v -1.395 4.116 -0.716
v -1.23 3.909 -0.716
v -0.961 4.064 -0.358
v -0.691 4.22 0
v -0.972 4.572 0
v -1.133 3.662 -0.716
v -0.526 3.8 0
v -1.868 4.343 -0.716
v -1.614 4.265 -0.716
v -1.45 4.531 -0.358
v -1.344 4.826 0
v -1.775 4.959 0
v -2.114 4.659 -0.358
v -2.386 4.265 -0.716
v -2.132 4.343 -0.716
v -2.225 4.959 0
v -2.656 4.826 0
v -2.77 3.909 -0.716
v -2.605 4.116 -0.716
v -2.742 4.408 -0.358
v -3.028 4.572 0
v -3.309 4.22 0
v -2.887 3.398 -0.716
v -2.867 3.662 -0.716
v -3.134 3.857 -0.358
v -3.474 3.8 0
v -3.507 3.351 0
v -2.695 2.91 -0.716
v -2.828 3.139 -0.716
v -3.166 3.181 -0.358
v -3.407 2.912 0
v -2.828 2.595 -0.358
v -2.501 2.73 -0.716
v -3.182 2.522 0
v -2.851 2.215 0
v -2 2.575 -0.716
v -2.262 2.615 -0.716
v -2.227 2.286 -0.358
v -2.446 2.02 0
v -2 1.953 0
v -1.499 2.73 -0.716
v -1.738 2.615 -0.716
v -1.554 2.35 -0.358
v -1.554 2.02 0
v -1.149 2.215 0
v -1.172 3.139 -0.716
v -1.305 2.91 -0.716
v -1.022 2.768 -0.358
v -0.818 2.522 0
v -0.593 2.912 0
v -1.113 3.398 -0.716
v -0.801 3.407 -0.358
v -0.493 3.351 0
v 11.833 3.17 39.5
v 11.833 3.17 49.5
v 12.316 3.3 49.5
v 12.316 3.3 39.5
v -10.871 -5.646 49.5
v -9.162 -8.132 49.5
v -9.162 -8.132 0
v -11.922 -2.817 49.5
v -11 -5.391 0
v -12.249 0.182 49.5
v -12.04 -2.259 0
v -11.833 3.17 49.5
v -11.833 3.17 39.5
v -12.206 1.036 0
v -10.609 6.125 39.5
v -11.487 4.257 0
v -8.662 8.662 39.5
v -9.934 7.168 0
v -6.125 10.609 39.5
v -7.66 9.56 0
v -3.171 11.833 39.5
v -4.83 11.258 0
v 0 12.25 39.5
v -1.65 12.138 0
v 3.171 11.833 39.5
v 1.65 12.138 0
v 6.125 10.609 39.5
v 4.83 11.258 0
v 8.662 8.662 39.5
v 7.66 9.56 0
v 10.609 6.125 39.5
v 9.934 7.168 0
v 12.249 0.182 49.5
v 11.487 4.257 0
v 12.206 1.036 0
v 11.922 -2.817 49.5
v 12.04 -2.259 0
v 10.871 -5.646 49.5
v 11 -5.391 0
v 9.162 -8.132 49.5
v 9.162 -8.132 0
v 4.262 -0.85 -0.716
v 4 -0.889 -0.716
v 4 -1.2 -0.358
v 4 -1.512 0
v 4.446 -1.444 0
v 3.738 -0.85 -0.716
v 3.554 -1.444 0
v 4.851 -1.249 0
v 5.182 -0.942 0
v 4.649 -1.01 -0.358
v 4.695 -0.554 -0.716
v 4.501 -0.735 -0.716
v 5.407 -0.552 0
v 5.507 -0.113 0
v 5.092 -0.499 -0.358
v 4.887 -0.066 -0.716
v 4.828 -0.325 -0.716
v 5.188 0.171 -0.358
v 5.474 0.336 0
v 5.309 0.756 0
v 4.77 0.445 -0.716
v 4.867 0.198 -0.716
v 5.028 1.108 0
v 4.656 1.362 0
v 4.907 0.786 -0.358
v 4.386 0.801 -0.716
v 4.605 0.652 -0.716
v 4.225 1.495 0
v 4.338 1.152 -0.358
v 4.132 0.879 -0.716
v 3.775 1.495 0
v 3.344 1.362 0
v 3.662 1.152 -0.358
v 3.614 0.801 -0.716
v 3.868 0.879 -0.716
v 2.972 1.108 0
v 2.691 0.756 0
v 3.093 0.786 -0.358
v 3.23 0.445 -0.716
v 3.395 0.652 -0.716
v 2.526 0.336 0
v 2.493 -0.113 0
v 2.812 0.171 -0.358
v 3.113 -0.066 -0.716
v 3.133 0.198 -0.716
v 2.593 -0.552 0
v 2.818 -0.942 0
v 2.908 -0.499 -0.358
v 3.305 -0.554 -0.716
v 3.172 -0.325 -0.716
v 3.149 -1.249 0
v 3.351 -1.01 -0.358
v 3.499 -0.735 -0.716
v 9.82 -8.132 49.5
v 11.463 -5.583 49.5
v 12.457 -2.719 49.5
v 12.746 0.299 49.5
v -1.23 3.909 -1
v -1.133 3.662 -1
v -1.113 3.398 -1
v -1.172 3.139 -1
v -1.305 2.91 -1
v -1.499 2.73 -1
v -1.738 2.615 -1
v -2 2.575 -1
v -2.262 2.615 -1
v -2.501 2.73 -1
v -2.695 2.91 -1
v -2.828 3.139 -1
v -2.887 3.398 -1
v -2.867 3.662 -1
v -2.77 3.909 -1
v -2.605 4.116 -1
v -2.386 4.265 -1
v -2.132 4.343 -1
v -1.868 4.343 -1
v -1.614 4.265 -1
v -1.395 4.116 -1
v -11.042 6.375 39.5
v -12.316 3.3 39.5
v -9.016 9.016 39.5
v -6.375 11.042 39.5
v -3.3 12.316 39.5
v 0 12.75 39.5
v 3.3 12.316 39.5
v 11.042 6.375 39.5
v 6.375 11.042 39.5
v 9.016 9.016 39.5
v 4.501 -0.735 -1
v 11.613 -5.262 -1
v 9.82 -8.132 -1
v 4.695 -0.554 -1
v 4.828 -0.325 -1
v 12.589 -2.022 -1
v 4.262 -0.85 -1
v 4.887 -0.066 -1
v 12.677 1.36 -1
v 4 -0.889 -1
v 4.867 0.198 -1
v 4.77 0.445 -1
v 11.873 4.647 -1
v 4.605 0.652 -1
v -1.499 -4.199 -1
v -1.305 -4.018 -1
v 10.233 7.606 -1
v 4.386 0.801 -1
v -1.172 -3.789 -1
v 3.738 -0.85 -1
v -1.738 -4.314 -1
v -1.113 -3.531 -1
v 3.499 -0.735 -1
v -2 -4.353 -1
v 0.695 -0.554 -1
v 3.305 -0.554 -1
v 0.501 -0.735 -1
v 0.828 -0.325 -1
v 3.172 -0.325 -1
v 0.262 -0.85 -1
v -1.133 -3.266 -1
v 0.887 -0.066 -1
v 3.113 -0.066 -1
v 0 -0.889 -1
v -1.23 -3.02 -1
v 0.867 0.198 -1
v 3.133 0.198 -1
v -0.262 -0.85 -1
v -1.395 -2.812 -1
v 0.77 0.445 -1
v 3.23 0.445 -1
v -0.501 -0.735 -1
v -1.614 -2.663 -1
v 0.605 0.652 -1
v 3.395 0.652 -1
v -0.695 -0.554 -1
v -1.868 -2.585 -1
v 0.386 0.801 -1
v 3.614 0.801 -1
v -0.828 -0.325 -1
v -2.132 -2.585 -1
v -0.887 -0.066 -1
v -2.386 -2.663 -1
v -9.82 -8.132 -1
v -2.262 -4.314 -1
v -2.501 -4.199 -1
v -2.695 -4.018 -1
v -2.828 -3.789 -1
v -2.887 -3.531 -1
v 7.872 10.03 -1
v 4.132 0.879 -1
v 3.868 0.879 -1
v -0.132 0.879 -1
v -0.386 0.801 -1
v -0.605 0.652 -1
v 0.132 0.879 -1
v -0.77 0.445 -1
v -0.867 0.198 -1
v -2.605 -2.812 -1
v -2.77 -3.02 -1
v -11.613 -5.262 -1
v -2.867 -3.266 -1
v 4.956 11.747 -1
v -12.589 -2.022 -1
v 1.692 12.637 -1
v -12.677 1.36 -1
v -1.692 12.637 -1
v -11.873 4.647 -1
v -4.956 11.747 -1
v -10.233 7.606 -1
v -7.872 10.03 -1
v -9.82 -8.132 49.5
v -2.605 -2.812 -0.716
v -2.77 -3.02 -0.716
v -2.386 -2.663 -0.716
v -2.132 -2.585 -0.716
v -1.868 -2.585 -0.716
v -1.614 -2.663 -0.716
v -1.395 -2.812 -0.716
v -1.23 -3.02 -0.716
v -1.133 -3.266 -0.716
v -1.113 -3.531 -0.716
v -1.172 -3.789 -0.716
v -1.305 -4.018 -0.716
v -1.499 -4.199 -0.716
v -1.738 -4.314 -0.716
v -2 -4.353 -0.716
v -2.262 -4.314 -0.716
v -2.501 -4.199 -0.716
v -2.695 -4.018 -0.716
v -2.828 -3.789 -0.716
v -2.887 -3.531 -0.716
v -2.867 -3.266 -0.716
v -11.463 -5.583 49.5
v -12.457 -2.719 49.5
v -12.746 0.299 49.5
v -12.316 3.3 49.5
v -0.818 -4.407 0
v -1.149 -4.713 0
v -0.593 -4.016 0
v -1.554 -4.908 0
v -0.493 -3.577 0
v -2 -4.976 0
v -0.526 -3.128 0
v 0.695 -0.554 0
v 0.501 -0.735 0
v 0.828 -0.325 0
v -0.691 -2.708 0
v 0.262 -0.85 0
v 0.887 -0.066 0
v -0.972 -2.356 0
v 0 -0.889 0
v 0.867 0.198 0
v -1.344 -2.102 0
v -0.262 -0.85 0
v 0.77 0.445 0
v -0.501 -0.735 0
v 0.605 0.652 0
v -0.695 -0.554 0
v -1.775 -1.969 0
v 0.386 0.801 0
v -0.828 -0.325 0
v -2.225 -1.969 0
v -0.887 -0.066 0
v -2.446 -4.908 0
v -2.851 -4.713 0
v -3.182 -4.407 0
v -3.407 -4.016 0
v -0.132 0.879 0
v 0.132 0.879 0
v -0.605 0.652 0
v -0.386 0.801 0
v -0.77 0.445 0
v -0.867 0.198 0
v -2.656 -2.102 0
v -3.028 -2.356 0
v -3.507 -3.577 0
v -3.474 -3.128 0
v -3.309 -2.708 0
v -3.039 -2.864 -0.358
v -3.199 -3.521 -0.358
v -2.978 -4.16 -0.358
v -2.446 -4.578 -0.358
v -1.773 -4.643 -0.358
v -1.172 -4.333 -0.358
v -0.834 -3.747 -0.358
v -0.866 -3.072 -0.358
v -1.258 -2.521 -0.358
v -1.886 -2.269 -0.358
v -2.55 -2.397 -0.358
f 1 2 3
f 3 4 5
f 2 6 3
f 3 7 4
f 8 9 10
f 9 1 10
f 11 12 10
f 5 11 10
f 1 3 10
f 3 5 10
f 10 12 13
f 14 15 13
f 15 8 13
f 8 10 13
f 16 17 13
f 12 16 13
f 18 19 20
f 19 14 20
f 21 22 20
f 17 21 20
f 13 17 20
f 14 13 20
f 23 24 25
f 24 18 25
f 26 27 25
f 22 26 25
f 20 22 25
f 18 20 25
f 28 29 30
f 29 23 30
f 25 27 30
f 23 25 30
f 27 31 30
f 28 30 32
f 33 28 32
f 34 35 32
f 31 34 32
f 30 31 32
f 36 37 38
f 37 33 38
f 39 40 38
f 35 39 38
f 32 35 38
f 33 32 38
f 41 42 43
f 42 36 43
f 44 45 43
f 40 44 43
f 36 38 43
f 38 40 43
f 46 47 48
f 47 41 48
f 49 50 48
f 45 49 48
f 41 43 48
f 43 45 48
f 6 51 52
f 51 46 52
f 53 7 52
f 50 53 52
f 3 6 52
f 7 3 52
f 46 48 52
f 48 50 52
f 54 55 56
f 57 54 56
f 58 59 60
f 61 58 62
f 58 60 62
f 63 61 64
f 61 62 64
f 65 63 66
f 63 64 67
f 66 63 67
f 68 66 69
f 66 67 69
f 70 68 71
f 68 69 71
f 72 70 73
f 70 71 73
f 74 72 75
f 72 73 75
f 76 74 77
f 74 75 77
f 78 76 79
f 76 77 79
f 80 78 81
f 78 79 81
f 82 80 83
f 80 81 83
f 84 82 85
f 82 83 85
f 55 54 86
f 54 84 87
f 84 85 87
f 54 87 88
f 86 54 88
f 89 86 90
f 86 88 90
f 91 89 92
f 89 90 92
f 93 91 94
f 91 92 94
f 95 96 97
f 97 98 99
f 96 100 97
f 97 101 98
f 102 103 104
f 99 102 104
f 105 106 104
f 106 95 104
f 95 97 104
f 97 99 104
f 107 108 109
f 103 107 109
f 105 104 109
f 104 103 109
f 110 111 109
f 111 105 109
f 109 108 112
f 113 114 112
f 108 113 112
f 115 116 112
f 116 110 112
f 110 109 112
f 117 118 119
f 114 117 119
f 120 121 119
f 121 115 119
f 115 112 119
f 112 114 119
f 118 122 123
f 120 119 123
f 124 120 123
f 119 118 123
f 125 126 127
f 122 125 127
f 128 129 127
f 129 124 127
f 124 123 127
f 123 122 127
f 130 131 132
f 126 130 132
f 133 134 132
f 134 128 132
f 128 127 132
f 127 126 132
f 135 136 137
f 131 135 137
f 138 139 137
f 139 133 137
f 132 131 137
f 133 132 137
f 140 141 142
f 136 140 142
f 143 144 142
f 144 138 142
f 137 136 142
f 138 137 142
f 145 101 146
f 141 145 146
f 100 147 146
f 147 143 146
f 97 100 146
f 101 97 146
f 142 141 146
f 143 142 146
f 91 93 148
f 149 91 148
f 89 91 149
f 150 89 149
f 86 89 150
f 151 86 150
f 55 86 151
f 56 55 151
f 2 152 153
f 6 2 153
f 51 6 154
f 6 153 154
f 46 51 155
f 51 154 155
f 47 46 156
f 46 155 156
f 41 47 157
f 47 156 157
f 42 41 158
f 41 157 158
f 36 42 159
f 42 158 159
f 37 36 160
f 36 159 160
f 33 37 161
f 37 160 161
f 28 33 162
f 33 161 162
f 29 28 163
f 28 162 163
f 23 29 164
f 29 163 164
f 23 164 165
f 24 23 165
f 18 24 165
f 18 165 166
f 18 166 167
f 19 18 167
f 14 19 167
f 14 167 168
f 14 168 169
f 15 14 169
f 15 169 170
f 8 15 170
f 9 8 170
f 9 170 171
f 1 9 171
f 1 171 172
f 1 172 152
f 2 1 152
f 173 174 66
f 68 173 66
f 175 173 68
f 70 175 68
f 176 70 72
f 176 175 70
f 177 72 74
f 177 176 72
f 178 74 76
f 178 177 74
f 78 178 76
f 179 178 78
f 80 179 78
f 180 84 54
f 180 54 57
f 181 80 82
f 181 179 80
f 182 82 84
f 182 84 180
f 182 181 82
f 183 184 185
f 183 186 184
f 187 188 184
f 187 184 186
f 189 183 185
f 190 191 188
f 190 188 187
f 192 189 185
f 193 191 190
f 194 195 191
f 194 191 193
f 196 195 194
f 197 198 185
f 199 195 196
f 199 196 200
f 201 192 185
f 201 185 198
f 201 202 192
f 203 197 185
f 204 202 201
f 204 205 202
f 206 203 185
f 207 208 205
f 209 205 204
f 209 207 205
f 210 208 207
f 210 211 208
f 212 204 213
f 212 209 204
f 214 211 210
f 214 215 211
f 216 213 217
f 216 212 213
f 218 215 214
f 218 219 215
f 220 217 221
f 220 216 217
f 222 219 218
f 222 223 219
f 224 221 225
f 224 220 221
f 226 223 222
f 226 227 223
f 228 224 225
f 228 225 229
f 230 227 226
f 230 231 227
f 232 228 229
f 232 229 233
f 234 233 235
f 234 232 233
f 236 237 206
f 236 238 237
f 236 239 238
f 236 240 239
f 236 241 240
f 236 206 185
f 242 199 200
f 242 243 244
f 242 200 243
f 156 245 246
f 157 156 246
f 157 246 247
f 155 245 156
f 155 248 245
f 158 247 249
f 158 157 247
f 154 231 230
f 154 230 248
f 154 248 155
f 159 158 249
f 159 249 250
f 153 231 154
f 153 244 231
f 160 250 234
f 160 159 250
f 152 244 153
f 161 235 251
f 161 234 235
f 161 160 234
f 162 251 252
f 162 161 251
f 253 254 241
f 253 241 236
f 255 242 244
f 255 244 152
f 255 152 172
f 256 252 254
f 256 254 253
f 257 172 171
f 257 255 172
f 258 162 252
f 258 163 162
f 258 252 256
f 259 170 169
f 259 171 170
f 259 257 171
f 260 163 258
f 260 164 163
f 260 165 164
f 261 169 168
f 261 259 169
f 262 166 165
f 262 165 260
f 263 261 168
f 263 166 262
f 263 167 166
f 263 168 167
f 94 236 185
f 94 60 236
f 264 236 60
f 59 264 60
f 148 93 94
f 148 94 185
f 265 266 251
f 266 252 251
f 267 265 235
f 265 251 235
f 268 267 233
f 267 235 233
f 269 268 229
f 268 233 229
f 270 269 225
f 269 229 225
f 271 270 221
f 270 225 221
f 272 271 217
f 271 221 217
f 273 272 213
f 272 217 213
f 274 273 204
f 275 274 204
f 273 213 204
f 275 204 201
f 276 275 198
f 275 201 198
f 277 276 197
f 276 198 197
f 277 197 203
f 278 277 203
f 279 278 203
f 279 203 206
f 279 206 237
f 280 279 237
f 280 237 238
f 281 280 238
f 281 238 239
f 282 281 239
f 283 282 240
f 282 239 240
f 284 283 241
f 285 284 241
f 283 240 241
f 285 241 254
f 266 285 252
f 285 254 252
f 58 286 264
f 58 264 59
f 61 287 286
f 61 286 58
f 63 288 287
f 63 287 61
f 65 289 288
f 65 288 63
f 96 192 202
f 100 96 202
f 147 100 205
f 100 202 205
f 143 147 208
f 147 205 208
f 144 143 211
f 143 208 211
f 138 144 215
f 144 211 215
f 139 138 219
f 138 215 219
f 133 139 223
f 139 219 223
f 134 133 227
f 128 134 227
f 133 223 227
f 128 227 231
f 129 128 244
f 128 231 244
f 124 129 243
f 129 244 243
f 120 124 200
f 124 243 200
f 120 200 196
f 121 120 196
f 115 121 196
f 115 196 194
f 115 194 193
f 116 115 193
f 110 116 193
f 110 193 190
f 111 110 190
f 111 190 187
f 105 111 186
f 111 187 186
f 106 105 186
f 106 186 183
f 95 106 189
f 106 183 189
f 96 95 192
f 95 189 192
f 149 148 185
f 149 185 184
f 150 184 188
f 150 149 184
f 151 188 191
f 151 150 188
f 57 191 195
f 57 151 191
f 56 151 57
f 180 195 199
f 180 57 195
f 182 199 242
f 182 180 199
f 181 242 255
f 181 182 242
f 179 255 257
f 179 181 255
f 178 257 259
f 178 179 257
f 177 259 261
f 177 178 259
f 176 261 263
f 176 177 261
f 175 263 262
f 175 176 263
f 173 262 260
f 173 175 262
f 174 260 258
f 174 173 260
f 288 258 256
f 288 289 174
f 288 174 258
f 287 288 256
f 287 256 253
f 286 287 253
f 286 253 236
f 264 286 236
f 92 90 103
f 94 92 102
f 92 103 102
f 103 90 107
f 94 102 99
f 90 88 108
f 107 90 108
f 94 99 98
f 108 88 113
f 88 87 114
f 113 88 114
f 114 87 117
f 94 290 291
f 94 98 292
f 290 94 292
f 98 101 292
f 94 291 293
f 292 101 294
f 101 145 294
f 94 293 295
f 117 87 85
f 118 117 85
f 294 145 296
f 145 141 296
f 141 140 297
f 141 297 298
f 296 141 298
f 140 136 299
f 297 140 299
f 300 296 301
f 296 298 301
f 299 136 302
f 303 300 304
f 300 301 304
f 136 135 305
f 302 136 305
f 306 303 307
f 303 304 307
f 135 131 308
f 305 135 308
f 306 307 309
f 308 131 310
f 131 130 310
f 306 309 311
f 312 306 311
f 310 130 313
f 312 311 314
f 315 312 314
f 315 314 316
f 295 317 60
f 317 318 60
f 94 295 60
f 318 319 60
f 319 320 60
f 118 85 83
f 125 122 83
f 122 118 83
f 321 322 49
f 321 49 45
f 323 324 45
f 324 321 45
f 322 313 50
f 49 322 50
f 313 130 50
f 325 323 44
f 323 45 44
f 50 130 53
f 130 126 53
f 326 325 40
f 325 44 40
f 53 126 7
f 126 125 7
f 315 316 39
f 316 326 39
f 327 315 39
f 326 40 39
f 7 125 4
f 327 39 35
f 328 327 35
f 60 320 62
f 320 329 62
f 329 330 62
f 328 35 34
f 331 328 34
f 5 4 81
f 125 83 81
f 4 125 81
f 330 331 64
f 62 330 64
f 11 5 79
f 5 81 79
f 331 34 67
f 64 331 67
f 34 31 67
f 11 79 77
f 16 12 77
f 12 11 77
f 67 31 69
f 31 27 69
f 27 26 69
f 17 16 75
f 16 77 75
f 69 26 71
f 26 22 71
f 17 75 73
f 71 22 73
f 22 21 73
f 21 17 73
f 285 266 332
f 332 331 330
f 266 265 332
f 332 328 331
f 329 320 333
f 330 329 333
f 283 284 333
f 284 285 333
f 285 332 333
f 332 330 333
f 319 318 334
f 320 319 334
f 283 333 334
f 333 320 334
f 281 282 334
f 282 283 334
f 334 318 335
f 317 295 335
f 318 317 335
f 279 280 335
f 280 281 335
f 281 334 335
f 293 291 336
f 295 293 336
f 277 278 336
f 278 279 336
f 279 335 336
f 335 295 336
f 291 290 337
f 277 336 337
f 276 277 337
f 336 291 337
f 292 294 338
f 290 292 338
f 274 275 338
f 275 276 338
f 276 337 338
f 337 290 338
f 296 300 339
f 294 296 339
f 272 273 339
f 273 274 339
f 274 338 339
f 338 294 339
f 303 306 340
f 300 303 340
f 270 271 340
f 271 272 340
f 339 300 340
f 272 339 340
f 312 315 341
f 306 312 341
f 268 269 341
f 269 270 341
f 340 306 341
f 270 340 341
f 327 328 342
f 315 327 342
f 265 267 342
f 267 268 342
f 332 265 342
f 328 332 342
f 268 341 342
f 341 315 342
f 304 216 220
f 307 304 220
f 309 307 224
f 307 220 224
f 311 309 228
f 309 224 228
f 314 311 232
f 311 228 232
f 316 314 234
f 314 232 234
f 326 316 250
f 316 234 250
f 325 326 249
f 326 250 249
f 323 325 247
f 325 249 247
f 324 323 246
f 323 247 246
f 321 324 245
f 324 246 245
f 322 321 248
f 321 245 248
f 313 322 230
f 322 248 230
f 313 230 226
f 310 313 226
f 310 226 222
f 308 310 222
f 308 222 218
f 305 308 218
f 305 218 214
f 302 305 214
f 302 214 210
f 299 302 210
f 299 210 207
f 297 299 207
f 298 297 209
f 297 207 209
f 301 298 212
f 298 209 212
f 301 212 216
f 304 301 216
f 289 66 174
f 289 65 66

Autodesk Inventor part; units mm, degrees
ref_plane "YZ Plane" through (0, 0, 0) normal (1, 0, 0) x (0, 1, 0)
sketch "Sketch1" plane through (0, 0, 0) normal (0, 0, 1) x (1, 0, 0)
  circle A0 centre (0, 0) radius 12.75
  circle A1 centre (0, 0) radius 12.25
  dimension "d0" = 25.5
  dimension "d1" = 24.5
extrude "Extrusion1" add sketch "Sketch1" along normal blind 49.5
sketch "Sketch2" plane through (0, 0, 49.5) normal (0, 0, 1) x (1, 0, 0)
  line L0 (-17.85, 0) -> (17.85, 0) projected
  line L1 (0, -17.85) -> (0, 17.85) projected
  line L2 (0, 0) -> (-12.3156, 3.2999)
  line L3 (0, 0) -> (-9.0156, -9.0156)
  line L4 (0, 0) -> (12.3156, 3.2999)
  line L5 (0, 0) -> (9.0156, -9.0156)
  arc A0 (11.8326, 3.1705) -> (-11.8326, 3.1705) centre (0, 0) ccw
  arc A1 (-8.6621, -8.6621) -> (8.6621, -8.6621) centre (0, 0) ccw
  circle A2 centre (0, 0) radius 12.75 projected
  dimension "d4" = 15
  dimension "d5" = 45
extrude "Extrusion2" cut sketch "Sketch2" against normal blind 10 contours L5 A1 L1 | L1 A1 L3 | A1 L5 A2 L1 | L1 A2 L3 A1 | A0 L2 A2 L1 | L1 A2 L4 A0
sketch "Sketch3" plane through (0, 0, 0) normal (0, 0, -1) x (-1, 0, 0)
  circle A0 centre (0, 0) radius 12.75 projected
extrude "Extrusion3" add sketch "Sketch3" along normal blind 1
ref_plane "Work Plane1" through (0, -12.75, 0) normal (0, 1, 0) x (-1, 0, 0)
ref_plane "Work Plane2" through (0, -12.75, 0) normal (0, 1, 0) x (-1, 0, 0)
sketch "Sketch7" plane through (0, 0, 49.5) normal (0, 0, 1) x (1, 0, 0)
  arc A0 (9.0156, -9.0156) -> (12.3156, 3.2999) centre (0, 0) ccw projected
  arc A1 (8.6621, -8.6621) -> (11.8326, 3.1705) centre (0, 0) ccw projected
  line L0 (8.6621, -8.6621) -> (9.0156, -9.0156) projected
  line L1 (-10.4211, -8.1317) -> (11.1081, -8.1317)
  line L2 (11.1081, -8.1317) -> (11.1081, -13.0652)
  line L3 (11.1081, -13.0652) -> (-10.4211, -13.0652)
  line L4 (-10.4211, -13.0652) -> (-10.4211, -8.1317)
extrude "Extrusion6" cut sketch "Sketch7" against normal through all
sketch "Sketch9" plane through (0, 0, 0) normal (0, 0, 1) x (1, 0, 0)
  arc A0 (9.1617, -8.1317) -> (-9.1617, -8.1317) centre (0, 0) ccw projected
  line L0 (-17.85, 0) -> (17.85, 0) projected
  point P0 (4, 0)
  dimension "d29" = 4
hole "Hole2" at (4, 0, 0) direction (0, 0, -1) diameter 1.778 depth 8 tip angle 118 countersink diameter 3.023 countersink angle 82 clearance for "Flat Head Machine Screw (82)" size "#0" standard "Ansi Unified Screw Threads"
pattern_circular "Circular Pattern1" count 3 over 360 about axis through (0, 0, -10) along (0, 0, 1) of "Hole2"
sketch "Sketch10" plane through (0, 0, 0) normal (0, 0, 1) x (1, 0, 0)
  arc A0 (9.1617, -8.1317) -> (-9.1617, -8.1317) centre (0, 0) ccw projected
hole "Hole3" at (0, 0, 0) direction (0, 0, -1) diameter 1.778 end through all
properties part number "ss_inner_guide_top"
